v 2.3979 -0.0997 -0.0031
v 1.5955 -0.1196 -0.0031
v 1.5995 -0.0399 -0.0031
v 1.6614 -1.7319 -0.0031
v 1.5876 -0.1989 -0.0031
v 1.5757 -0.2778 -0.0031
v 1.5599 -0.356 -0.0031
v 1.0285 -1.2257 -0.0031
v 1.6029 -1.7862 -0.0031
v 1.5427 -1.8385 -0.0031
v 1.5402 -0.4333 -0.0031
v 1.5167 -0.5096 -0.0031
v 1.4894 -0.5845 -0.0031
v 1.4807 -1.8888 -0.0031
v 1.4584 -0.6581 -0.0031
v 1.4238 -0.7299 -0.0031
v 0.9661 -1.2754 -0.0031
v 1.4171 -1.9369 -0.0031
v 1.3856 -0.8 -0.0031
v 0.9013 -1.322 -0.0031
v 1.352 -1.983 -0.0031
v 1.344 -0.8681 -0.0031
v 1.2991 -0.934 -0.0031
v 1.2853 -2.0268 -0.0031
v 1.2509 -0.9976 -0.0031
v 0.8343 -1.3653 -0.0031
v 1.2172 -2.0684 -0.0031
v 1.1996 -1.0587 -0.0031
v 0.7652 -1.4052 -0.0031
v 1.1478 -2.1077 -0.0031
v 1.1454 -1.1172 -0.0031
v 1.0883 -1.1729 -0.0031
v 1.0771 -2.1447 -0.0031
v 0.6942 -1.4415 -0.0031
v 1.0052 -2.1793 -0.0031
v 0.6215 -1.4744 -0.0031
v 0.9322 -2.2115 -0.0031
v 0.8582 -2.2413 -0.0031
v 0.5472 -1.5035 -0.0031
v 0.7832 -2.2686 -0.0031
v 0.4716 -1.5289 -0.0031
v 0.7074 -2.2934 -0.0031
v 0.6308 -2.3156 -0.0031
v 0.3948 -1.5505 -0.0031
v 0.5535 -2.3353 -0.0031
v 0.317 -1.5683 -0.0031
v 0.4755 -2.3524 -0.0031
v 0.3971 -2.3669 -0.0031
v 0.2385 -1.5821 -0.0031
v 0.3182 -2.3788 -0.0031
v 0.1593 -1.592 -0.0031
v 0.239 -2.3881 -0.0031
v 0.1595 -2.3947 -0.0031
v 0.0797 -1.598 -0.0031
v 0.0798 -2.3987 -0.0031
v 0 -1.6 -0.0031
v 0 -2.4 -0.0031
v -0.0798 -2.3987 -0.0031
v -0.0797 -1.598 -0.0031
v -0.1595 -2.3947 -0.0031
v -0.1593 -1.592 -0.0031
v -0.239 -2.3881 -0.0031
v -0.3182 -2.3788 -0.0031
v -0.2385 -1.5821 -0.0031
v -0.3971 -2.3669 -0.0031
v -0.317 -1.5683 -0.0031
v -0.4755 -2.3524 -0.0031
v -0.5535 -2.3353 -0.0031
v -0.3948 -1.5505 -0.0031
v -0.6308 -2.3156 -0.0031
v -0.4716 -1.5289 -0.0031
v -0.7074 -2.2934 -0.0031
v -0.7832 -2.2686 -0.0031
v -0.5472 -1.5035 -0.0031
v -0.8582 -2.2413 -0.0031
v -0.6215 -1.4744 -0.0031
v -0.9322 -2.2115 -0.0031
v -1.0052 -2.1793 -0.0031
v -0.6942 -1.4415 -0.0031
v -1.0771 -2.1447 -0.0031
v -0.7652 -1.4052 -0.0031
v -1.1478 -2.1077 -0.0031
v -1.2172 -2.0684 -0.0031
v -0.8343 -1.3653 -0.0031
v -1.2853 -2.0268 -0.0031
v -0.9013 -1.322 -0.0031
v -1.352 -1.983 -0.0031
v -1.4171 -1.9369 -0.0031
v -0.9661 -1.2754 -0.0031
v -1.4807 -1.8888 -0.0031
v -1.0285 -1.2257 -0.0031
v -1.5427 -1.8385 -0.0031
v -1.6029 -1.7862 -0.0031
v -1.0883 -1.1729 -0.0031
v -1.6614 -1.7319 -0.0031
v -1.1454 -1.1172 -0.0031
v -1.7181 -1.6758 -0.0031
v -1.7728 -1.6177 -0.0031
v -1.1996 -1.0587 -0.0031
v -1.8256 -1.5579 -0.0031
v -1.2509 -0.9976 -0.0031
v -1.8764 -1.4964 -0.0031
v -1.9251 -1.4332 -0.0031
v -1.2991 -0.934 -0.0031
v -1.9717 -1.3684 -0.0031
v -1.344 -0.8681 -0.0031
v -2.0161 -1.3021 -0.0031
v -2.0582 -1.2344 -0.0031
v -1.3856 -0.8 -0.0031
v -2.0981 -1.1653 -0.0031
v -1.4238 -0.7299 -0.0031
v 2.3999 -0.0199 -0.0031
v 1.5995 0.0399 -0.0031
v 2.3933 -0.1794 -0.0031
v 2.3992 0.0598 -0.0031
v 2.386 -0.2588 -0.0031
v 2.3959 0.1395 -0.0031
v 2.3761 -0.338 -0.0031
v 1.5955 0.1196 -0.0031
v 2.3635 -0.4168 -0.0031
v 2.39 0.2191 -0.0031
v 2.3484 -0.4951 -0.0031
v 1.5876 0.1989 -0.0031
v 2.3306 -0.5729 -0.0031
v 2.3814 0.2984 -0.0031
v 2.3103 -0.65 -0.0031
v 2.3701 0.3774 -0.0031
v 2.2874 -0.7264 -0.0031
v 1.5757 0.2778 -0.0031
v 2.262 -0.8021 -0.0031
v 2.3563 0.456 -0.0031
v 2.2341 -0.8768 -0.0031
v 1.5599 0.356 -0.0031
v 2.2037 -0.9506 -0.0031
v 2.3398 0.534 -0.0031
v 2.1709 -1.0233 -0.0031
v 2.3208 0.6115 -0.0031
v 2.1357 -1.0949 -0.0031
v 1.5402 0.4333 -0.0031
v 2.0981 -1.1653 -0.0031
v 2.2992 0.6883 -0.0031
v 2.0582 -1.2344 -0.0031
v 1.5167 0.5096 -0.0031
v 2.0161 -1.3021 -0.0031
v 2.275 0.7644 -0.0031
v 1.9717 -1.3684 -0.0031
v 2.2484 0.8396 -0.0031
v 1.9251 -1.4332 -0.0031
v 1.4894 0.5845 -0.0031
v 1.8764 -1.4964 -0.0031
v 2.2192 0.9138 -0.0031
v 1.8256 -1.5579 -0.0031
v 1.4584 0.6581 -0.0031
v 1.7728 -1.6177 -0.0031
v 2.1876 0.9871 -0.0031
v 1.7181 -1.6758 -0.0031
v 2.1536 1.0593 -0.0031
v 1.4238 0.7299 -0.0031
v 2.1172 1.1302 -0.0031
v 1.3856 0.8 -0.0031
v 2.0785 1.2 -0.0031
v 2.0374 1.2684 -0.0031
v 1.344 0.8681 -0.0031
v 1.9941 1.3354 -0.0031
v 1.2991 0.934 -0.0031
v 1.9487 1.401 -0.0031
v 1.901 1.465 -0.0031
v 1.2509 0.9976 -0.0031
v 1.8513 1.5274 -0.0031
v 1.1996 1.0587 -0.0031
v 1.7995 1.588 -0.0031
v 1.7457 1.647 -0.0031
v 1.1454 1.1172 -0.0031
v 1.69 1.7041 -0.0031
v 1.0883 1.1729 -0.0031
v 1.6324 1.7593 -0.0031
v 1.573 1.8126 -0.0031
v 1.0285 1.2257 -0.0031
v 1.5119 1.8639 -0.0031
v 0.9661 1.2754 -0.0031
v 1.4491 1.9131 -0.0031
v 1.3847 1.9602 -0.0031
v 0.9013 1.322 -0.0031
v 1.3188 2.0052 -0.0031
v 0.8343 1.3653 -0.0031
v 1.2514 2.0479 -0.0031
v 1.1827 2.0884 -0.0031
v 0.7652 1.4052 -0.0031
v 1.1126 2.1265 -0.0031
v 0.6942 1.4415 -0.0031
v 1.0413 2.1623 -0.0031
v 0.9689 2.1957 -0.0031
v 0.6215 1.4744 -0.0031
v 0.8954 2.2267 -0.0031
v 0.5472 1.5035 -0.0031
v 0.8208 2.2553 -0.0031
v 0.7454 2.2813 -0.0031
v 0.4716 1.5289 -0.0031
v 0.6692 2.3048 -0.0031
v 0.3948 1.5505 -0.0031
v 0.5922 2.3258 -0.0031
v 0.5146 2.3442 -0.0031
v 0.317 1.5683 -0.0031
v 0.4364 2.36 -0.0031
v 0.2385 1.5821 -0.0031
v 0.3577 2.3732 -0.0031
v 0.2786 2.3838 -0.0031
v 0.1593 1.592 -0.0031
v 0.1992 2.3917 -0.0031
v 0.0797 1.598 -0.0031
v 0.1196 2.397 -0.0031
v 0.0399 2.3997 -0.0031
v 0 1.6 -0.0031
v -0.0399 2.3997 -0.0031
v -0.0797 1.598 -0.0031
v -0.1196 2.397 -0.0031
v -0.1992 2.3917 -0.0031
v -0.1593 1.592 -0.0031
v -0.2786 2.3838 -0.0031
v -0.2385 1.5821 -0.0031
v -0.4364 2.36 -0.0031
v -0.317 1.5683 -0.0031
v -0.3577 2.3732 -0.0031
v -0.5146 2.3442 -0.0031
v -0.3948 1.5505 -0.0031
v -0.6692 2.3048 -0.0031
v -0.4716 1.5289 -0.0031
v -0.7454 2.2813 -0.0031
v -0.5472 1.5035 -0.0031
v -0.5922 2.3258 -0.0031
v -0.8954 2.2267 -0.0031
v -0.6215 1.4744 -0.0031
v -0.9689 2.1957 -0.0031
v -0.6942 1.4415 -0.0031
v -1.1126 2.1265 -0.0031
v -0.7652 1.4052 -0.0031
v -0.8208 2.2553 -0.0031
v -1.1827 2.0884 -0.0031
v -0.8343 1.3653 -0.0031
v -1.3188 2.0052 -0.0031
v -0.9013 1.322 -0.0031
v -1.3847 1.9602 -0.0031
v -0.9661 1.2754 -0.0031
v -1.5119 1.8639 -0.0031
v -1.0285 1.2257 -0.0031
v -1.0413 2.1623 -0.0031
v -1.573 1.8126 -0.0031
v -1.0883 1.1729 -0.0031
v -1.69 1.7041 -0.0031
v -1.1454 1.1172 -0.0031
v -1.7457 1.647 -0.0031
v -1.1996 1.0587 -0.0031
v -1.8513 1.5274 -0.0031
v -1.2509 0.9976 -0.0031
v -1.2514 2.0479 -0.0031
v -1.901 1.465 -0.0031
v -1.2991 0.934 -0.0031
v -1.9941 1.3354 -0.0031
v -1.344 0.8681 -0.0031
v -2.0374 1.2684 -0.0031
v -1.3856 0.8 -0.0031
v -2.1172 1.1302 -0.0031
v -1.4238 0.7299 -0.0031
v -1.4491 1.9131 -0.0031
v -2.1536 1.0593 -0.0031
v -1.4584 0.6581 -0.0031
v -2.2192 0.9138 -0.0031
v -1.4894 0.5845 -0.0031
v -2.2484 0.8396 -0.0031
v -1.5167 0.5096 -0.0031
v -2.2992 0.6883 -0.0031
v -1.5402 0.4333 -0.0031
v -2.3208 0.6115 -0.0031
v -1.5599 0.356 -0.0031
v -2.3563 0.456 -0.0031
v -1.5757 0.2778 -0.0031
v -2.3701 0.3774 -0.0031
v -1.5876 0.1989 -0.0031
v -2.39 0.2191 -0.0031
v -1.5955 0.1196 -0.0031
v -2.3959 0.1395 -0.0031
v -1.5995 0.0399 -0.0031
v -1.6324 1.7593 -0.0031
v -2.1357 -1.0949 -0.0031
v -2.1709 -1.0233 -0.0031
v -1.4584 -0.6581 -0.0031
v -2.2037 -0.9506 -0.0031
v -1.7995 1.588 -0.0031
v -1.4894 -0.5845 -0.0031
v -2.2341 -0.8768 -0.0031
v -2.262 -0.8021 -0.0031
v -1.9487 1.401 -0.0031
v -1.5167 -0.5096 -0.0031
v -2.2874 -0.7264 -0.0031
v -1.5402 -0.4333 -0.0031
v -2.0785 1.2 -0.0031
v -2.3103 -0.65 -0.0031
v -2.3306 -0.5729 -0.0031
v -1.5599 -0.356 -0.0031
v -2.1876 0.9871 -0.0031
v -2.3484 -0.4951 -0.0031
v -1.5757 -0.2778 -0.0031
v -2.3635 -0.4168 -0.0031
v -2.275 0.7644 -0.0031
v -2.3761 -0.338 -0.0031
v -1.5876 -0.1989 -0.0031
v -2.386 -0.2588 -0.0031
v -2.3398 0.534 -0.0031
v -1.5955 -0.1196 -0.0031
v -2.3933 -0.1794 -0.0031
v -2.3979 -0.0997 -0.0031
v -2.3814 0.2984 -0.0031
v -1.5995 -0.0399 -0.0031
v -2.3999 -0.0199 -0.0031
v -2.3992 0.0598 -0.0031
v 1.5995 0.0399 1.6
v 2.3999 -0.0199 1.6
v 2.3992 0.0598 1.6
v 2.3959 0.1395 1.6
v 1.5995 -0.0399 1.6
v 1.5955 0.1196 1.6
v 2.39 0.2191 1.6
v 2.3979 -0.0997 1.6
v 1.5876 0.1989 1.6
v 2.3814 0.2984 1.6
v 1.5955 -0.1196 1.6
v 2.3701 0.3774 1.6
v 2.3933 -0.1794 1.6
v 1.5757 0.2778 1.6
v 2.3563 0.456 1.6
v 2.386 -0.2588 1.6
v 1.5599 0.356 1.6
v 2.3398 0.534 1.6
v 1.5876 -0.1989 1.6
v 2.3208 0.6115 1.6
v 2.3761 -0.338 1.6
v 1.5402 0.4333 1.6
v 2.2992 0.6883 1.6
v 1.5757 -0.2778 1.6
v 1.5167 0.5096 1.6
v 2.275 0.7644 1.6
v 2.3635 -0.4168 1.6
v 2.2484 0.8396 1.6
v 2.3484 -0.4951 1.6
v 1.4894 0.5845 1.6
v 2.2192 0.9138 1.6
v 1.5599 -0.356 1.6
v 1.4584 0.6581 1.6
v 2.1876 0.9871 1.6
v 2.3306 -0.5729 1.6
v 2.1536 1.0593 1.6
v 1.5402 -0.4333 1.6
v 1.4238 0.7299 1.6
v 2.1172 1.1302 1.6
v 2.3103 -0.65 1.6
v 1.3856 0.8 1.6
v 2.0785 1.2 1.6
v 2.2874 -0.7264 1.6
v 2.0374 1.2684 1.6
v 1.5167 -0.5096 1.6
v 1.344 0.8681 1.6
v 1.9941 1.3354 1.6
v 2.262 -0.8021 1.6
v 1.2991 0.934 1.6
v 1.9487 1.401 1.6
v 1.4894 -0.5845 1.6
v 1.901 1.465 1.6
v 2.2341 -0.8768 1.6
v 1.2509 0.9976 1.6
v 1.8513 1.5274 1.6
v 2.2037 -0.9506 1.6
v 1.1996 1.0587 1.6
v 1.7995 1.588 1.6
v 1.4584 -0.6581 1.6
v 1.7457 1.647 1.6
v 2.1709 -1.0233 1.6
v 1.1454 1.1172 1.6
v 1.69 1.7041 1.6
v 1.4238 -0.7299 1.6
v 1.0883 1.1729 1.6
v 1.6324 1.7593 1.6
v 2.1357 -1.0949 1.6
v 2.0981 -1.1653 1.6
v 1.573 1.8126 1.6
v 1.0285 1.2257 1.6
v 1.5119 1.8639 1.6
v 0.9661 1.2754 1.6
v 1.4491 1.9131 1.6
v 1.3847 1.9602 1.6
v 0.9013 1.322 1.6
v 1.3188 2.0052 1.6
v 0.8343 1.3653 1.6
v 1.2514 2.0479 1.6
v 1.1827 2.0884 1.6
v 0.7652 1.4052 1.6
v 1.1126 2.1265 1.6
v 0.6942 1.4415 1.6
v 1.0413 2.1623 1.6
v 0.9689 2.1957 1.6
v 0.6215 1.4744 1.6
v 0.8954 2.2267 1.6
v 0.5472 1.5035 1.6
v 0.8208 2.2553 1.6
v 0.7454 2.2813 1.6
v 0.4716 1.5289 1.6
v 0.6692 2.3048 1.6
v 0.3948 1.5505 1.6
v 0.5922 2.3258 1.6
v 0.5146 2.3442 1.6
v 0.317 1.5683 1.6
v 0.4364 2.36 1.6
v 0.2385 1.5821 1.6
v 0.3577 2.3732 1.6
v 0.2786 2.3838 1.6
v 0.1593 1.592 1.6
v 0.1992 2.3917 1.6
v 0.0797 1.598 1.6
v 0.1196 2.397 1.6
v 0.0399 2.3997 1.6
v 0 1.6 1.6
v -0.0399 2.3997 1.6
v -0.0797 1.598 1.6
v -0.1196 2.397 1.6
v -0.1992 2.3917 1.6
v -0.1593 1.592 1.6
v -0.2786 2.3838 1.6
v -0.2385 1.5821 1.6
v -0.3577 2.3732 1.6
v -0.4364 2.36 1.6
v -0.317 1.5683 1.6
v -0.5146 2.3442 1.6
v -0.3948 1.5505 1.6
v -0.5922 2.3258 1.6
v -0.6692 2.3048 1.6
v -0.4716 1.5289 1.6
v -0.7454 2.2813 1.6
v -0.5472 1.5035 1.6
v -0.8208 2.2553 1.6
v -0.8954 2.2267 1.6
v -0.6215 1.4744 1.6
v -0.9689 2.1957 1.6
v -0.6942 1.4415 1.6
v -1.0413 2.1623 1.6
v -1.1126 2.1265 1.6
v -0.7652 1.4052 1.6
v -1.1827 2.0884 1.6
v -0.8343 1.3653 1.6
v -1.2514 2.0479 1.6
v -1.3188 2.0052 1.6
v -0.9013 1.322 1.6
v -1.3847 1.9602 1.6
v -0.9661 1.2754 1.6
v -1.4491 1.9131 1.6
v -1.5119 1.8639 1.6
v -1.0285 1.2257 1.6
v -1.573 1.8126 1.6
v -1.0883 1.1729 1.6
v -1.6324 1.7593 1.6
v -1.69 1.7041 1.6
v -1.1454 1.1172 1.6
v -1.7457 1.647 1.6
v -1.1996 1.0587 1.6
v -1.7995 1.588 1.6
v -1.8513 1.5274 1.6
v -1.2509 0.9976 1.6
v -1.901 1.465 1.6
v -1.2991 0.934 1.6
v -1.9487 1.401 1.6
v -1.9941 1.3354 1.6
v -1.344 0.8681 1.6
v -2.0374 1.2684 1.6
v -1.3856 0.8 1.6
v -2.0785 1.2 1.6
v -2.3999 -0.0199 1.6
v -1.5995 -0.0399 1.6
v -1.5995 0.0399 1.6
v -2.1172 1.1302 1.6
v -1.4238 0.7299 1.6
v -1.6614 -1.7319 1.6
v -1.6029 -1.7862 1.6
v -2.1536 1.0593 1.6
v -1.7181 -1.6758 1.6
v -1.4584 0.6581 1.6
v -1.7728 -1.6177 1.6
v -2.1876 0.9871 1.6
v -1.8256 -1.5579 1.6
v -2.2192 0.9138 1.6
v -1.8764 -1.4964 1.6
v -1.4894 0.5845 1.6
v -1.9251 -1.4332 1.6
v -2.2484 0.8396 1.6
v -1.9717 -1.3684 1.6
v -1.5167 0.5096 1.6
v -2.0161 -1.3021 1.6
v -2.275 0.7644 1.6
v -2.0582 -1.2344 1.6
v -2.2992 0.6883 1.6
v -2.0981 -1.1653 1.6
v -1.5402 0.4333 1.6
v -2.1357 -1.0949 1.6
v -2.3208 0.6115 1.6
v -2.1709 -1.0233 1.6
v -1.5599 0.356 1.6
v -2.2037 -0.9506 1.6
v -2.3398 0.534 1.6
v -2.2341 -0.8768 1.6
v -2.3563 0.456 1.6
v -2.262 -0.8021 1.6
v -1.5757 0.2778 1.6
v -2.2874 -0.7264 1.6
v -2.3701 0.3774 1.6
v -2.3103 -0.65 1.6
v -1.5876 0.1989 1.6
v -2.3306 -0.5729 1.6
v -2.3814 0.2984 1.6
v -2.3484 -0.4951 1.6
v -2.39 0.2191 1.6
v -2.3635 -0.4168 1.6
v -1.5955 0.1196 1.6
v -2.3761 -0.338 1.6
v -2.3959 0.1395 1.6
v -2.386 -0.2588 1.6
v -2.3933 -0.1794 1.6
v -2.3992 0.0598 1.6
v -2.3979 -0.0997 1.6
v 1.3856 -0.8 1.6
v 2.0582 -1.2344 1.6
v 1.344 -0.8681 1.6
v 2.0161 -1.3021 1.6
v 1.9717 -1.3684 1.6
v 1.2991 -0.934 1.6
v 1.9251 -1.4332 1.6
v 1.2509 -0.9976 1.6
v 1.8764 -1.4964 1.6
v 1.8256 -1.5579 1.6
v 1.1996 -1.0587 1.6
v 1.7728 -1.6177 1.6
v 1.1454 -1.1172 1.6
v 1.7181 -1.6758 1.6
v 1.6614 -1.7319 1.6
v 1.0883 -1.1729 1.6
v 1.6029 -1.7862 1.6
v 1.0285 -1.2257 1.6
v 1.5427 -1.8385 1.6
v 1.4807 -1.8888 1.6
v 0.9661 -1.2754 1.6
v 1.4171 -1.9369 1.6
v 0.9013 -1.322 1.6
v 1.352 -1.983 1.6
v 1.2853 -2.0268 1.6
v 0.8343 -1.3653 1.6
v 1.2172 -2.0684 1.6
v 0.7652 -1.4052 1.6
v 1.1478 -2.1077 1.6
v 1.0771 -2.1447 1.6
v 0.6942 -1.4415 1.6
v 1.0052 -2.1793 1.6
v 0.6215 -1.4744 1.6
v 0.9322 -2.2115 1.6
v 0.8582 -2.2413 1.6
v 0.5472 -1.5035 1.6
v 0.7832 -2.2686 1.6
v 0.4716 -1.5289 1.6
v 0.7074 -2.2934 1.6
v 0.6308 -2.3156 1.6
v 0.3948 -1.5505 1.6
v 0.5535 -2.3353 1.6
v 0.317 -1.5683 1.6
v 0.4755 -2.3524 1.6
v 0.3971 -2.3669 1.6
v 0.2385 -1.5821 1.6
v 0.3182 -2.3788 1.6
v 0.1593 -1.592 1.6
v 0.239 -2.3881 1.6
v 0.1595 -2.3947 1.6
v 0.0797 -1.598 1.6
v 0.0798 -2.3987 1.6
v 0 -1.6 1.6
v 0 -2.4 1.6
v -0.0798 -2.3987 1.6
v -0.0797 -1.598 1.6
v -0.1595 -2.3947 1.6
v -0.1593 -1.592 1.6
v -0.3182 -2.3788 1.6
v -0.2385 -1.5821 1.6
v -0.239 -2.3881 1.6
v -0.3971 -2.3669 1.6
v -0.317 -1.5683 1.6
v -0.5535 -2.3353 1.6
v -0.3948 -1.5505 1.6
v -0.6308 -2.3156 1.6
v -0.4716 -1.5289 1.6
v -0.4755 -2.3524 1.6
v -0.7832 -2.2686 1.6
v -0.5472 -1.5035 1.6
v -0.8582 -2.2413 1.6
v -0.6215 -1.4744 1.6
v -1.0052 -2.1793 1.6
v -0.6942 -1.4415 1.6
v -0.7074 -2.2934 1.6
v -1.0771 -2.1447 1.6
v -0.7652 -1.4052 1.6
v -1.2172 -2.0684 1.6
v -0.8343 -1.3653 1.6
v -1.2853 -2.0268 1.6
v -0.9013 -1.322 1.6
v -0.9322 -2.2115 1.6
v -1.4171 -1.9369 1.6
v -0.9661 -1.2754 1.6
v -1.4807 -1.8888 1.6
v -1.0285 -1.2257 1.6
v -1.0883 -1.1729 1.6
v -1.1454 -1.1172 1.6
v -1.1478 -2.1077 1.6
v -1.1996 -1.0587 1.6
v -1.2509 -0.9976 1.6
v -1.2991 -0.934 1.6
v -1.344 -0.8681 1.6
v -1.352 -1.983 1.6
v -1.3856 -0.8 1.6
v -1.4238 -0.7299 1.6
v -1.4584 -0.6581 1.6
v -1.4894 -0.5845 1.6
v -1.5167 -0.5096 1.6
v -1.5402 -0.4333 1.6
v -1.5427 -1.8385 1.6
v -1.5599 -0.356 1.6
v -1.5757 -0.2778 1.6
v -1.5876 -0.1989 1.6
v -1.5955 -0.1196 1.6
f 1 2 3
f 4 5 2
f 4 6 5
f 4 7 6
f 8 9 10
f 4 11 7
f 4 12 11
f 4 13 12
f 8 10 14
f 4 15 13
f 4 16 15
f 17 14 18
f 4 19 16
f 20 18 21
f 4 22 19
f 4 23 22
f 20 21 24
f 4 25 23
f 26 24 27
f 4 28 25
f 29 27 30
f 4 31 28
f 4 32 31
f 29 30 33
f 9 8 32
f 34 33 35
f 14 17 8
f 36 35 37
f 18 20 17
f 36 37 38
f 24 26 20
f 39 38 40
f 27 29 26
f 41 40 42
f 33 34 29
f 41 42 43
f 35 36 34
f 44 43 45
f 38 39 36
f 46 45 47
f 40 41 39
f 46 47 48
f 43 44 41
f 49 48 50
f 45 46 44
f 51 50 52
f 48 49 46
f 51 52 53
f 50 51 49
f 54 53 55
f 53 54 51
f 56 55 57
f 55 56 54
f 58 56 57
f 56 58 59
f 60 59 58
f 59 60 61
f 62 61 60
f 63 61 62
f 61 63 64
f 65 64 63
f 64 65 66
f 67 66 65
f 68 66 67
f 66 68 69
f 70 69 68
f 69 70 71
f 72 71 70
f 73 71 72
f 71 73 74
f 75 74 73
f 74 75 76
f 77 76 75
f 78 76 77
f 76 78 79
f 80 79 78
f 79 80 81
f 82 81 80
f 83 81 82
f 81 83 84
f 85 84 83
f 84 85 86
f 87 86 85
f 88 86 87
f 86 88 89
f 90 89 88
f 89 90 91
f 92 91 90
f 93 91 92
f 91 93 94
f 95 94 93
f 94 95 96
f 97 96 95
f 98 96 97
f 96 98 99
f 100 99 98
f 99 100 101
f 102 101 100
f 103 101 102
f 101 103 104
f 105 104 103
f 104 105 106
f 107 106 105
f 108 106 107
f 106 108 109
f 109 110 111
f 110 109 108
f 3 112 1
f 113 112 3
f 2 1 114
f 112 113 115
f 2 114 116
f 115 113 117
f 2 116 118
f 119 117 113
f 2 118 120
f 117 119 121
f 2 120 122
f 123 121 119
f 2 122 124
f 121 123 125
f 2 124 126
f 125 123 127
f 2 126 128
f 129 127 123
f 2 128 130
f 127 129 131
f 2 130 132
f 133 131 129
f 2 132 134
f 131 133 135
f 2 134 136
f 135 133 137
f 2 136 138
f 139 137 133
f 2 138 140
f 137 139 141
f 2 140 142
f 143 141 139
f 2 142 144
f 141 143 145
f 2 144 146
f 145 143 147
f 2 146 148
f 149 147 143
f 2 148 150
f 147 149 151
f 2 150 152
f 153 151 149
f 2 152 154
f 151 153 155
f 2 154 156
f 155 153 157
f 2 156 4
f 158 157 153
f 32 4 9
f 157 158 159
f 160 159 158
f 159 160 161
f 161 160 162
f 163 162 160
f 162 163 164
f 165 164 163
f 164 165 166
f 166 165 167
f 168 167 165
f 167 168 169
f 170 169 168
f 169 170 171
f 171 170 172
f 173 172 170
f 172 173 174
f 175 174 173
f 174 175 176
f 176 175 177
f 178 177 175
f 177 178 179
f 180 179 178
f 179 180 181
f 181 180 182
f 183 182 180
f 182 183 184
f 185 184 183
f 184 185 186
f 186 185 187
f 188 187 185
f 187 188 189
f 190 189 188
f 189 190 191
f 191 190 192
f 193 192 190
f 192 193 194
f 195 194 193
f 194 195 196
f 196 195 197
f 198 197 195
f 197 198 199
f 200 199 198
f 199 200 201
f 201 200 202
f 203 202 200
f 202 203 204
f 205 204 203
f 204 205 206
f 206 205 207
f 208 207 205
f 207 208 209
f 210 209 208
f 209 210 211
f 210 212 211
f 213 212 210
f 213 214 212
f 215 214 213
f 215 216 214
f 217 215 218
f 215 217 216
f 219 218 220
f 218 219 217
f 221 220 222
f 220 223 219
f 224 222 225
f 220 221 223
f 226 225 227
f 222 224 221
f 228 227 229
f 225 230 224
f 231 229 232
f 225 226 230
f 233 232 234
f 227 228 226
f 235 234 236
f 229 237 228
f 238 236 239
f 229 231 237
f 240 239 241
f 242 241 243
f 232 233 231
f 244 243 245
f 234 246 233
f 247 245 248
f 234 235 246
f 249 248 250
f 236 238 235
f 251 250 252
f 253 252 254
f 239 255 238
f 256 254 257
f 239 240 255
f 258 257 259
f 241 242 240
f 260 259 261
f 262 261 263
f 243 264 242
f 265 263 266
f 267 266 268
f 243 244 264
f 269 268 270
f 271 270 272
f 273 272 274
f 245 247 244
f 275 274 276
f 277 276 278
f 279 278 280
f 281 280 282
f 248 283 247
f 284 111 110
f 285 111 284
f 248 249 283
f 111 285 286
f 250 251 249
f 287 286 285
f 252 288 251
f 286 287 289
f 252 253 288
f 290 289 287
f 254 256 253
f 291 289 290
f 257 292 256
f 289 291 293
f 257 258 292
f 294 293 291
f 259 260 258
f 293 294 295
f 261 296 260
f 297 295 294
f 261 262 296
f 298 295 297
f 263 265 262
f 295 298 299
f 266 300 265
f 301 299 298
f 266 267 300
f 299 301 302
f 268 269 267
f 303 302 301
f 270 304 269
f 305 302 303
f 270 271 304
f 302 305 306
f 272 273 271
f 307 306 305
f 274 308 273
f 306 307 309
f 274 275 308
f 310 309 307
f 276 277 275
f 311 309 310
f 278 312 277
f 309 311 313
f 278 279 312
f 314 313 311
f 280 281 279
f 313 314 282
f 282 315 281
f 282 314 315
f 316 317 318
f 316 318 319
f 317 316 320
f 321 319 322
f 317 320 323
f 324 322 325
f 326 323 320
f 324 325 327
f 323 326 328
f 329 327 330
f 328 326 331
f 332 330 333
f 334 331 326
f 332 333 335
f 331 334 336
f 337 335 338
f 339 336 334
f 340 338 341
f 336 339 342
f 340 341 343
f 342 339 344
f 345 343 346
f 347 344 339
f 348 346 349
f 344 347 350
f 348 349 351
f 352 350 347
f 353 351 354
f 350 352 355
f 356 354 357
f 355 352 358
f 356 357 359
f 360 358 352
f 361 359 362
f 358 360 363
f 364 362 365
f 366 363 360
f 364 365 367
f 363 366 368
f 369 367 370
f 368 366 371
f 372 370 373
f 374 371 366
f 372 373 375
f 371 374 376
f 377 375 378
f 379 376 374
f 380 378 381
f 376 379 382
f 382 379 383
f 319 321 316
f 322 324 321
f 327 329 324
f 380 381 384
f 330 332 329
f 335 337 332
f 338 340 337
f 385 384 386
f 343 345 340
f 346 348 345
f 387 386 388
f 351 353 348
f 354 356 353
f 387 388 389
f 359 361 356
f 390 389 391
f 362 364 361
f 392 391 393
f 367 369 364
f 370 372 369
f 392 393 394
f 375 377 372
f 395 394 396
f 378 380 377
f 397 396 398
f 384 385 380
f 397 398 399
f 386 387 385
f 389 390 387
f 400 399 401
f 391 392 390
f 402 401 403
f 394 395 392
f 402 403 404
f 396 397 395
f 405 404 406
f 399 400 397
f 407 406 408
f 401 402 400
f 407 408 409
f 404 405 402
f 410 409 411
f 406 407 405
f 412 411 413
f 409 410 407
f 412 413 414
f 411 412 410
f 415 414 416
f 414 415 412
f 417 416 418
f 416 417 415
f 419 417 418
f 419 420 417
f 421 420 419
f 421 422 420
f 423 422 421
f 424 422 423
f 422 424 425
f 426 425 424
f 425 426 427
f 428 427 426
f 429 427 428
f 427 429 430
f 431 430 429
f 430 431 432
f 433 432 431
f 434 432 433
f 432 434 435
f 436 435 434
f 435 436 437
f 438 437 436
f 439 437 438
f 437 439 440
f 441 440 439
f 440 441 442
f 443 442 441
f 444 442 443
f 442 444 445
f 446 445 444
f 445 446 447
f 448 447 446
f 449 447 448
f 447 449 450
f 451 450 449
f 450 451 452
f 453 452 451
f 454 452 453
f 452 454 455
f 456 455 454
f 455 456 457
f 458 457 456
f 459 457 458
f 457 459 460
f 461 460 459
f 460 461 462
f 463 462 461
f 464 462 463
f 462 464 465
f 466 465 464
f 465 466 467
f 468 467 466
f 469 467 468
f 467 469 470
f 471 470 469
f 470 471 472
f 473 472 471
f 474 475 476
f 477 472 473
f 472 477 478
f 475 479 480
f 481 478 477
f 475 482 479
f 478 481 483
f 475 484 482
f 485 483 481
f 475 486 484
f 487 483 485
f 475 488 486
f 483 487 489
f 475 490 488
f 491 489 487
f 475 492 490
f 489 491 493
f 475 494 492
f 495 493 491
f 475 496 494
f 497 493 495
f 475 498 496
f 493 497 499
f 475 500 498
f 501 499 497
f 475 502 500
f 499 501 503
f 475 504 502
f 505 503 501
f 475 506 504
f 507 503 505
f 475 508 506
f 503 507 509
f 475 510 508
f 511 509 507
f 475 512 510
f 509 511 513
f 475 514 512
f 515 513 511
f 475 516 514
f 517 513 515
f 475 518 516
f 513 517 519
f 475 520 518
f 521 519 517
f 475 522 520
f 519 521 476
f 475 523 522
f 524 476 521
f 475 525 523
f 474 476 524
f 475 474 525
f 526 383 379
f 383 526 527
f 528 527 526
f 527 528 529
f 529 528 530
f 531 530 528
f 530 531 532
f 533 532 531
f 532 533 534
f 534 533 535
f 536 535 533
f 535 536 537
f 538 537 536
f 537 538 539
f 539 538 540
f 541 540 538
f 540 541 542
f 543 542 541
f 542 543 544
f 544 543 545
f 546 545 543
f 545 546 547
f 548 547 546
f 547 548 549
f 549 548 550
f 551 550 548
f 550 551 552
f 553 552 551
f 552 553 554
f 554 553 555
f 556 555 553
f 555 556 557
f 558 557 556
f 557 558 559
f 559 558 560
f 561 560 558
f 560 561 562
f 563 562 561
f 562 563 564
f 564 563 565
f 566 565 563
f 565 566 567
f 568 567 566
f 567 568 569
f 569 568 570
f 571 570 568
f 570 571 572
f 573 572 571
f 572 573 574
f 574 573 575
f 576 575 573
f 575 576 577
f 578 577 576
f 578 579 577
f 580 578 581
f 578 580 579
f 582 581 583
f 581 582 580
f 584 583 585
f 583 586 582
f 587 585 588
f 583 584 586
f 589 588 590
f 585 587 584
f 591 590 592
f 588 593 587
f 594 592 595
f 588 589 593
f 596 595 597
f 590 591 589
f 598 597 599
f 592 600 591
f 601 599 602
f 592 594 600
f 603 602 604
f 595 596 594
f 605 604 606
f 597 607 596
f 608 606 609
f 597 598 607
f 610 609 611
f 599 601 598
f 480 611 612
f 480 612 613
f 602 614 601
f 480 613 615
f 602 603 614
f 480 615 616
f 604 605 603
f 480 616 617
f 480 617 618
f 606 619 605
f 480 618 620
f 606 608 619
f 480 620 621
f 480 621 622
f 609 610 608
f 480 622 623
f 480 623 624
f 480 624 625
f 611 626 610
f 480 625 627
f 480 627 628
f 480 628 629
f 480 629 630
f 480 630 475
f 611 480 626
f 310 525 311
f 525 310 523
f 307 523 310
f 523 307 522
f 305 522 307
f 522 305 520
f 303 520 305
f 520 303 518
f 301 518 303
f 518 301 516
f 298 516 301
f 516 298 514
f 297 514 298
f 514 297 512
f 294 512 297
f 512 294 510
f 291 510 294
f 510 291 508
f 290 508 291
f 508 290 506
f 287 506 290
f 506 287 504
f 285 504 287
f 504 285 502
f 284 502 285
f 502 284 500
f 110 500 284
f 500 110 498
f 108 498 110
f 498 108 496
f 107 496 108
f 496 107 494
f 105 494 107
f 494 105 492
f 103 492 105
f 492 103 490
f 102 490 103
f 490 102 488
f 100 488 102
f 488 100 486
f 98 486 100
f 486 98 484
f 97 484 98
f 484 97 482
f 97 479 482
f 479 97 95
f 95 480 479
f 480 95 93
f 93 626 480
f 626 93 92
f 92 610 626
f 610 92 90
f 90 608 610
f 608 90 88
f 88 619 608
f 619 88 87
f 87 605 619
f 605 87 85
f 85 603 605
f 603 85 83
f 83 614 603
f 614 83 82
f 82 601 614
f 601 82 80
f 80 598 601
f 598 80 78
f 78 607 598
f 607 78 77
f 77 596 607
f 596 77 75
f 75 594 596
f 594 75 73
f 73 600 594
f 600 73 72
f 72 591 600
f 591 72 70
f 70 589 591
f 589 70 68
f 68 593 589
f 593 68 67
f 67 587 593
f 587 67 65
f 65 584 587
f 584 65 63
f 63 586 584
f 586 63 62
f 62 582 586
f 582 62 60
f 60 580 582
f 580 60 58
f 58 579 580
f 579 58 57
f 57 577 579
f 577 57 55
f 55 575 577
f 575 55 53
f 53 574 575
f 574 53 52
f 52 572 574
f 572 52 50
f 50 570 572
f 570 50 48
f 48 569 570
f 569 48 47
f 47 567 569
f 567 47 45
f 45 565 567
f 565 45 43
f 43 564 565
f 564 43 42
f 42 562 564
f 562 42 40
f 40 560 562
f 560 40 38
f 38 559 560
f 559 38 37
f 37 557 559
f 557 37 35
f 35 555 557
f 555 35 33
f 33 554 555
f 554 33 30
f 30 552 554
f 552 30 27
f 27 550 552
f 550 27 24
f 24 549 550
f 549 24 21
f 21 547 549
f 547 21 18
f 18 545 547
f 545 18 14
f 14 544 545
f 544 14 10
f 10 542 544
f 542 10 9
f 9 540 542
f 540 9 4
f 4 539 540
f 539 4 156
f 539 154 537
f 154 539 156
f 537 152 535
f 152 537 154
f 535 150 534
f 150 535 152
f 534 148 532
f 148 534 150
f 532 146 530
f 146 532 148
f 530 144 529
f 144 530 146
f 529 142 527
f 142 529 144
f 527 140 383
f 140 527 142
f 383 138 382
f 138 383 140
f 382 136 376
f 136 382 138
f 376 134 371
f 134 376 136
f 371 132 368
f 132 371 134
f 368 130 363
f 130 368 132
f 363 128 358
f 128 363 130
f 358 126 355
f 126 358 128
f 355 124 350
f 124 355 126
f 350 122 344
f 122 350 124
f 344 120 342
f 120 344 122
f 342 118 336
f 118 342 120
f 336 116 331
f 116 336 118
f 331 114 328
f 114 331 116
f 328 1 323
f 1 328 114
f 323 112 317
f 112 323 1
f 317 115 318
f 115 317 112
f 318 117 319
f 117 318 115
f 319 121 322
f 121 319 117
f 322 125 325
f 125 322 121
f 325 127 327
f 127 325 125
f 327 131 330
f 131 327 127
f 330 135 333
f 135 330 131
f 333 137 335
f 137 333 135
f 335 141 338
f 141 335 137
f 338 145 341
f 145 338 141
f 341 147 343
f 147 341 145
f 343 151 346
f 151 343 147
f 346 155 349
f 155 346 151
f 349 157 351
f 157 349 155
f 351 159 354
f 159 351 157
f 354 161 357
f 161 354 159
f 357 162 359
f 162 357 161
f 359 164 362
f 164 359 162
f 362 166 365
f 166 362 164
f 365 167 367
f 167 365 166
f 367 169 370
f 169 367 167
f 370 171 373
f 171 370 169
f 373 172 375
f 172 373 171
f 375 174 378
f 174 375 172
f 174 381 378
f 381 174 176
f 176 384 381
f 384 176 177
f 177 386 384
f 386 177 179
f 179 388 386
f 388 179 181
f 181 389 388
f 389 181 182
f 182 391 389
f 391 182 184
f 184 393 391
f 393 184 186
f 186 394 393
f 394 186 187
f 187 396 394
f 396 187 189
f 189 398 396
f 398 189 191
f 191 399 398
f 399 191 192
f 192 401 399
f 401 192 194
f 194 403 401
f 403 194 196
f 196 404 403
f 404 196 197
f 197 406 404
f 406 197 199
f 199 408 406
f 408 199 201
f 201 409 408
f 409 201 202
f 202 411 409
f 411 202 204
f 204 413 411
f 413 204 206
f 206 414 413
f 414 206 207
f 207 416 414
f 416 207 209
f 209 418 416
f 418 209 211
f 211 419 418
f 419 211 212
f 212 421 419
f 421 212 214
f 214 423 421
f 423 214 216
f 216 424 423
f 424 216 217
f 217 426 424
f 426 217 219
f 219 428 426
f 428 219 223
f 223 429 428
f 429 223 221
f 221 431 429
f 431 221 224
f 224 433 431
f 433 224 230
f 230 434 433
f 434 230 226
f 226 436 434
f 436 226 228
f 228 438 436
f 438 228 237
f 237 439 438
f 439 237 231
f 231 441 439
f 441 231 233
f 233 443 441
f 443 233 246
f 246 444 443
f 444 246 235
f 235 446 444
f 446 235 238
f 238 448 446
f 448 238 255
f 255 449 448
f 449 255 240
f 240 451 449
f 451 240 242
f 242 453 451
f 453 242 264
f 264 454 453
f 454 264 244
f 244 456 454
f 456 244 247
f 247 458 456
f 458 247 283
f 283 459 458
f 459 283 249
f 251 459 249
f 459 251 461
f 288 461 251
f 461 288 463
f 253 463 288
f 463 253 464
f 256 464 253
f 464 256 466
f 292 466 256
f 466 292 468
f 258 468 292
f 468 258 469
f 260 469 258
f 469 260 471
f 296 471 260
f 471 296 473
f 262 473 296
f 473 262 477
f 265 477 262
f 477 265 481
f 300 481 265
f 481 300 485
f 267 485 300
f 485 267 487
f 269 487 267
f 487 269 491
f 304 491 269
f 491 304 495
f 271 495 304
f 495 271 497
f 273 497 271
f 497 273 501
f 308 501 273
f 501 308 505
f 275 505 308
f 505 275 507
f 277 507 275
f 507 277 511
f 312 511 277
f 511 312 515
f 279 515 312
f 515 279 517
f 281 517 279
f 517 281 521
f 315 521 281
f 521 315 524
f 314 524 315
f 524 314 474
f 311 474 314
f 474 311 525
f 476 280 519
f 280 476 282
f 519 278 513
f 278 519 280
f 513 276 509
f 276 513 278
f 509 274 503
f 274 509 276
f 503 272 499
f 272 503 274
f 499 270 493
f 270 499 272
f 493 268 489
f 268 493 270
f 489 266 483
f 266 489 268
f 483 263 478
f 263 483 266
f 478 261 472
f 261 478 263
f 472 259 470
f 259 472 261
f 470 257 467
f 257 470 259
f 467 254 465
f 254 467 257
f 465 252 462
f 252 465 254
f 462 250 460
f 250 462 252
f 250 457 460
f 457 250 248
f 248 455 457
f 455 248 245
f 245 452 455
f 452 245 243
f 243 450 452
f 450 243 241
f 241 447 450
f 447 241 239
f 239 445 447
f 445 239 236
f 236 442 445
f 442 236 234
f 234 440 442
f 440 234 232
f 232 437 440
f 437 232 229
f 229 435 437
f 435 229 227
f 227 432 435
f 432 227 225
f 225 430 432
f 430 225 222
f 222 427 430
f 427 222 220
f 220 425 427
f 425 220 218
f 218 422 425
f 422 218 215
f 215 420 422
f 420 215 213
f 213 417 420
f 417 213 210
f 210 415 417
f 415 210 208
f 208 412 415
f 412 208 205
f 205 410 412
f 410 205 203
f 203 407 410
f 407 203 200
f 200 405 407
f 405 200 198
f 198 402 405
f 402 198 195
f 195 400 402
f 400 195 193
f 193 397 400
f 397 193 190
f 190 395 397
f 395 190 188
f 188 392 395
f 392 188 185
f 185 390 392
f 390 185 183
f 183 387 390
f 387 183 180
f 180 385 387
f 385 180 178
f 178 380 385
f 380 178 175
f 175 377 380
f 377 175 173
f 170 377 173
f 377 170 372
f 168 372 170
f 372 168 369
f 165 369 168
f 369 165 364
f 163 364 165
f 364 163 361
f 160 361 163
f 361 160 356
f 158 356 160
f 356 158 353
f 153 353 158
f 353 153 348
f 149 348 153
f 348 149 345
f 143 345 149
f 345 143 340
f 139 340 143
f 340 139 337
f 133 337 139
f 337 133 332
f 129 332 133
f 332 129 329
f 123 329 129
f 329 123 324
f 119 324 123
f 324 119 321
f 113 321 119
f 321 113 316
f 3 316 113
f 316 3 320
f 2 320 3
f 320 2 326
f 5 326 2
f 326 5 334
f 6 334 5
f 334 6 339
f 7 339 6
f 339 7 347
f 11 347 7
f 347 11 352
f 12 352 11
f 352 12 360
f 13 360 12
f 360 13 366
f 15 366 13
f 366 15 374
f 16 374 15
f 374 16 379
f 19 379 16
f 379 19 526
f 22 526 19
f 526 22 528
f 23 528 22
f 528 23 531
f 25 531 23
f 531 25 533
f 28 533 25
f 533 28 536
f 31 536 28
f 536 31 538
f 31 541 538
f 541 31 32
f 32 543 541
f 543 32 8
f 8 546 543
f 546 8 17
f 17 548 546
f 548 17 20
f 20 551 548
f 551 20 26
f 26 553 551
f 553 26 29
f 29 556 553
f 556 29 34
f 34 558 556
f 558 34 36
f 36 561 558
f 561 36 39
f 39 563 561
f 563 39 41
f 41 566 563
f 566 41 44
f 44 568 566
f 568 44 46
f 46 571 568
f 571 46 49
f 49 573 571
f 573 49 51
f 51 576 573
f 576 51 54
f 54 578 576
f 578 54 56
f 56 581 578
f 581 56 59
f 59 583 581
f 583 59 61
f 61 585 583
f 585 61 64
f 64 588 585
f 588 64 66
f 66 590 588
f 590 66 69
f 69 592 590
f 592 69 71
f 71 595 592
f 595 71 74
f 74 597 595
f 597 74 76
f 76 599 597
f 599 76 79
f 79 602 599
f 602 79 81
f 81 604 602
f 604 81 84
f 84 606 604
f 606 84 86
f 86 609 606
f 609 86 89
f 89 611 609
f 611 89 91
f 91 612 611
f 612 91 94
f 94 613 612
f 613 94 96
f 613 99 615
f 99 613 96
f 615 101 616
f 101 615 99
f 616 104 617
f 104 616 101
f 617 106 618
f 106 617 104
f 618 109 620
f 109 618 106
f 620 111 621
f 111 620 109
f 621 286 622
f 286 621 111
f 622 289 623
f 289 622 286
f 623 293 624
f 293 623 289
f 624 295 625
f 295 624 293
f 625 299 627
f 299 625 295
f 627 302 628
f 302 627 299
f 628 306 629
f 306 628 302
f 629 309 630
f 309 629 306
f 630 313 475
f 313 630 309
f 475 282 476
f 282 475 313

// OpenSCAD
use <../lib.scad>
use <s/2468s01.scad>
use <s/3298p53c.scad>
$fa=1; $fs=0.2;
function ldraw_lib__2468p53(realsolid=false) = [
// 0 Panel  3 x  3 x  6 Corner Convex with Space Police Left Pattern
// 0 Name: 2468p53.dat
// 0 Author: Carsten Schmitz [Deckard]
// 0 !LDRAW_ORG Part UPDATE 2013-01
// 0 !LICENSE Licensed under CC BY 2.0 and CC BY 4.0 : see CAreadme.txt
// 
// 0 BFC CERTIFY CCW
  [0,"BFC","CERTIFY"],
  [0,"BFC","CCW"],
// 
// 0 !KEYWORDS Space Police I Logo
// 
// 0 !HISTORY 2004-09-15 [PTadmin] Official Update 2004-03
// 0 !HISTORY 2007-05-13 [PTadmin] Header formatted for Contributor Agreement
// 0 !HISTORY 2008-07-01 [PTadmin] Official Update 2008-01
// 0 !HISTORY 2013-02-24 [MagFors] BFC'd, color corrections, used subfiles
// 0 !HISTORY 2013-07-21 [PTadmin] Official Update 2013-01
// 
// 
// 1 16 0 0 0 1 0 0 0 1 0 0 0 1 s\2468s01.dat
  [1,16,0,0,0,1,0,0,0,1,0,0,0,1, ldraw_lib__s__2468s01(realsolid)],
// 4 16 13.8 38.7 -46.2 46.2 38.7 -13.8 50 34 -10 10 34 -50
  [4,16,13.8,38.7,-46.2,46.2,38.7,-13.8,50,34,-10,10,34,-50],
// 4 16 10 34 -50 10 90 -50 13.8 84.3 -46.2 13.8 38.7 -46.2
  [4,16,10,34,-50,10,90,-50,13.8,84.3,-46.2,13.8,38.7,-46.2],
// 4 16 46.2 38.7 -13.8 46.2 84.3 -13.8 50 90 -10 50 34 -10
  [4,16,46.2,38.7,-13.8,46.2,84.3,-13.8,50,90,-10,50,34,-10],
// 4 16 10 90 -50 50 90 -10 46.2 84.3 -13.8 13.8 84.3 -46.2
  [4,16,10,90,-50,50,90,-10,46.2,84.3,-13.8,13.8,84.3,-46.2],
// 1 16 30 61.5 -30 0 0 -0.81 -1.14 0 0 0 1 -0.81 s\3298p53c.dat
  [1,16,30,61.5,-30,0,0,-0.81,-1.14,0,0,0,1,-0.81, ldraw_lib__s__3298p53c(realsolid)],
];
module ldraw_lib__2468p53(step=0, col=false, unit=2/5, alt=false, line=0.2, solid=!$preview)
    makepoly(ldraw_lib__2468p53(solid), step=step, col=col, unit=unit, alt=alt, line=line, solid=solid);
ldraw_lib__2468p53(line=0.2);
